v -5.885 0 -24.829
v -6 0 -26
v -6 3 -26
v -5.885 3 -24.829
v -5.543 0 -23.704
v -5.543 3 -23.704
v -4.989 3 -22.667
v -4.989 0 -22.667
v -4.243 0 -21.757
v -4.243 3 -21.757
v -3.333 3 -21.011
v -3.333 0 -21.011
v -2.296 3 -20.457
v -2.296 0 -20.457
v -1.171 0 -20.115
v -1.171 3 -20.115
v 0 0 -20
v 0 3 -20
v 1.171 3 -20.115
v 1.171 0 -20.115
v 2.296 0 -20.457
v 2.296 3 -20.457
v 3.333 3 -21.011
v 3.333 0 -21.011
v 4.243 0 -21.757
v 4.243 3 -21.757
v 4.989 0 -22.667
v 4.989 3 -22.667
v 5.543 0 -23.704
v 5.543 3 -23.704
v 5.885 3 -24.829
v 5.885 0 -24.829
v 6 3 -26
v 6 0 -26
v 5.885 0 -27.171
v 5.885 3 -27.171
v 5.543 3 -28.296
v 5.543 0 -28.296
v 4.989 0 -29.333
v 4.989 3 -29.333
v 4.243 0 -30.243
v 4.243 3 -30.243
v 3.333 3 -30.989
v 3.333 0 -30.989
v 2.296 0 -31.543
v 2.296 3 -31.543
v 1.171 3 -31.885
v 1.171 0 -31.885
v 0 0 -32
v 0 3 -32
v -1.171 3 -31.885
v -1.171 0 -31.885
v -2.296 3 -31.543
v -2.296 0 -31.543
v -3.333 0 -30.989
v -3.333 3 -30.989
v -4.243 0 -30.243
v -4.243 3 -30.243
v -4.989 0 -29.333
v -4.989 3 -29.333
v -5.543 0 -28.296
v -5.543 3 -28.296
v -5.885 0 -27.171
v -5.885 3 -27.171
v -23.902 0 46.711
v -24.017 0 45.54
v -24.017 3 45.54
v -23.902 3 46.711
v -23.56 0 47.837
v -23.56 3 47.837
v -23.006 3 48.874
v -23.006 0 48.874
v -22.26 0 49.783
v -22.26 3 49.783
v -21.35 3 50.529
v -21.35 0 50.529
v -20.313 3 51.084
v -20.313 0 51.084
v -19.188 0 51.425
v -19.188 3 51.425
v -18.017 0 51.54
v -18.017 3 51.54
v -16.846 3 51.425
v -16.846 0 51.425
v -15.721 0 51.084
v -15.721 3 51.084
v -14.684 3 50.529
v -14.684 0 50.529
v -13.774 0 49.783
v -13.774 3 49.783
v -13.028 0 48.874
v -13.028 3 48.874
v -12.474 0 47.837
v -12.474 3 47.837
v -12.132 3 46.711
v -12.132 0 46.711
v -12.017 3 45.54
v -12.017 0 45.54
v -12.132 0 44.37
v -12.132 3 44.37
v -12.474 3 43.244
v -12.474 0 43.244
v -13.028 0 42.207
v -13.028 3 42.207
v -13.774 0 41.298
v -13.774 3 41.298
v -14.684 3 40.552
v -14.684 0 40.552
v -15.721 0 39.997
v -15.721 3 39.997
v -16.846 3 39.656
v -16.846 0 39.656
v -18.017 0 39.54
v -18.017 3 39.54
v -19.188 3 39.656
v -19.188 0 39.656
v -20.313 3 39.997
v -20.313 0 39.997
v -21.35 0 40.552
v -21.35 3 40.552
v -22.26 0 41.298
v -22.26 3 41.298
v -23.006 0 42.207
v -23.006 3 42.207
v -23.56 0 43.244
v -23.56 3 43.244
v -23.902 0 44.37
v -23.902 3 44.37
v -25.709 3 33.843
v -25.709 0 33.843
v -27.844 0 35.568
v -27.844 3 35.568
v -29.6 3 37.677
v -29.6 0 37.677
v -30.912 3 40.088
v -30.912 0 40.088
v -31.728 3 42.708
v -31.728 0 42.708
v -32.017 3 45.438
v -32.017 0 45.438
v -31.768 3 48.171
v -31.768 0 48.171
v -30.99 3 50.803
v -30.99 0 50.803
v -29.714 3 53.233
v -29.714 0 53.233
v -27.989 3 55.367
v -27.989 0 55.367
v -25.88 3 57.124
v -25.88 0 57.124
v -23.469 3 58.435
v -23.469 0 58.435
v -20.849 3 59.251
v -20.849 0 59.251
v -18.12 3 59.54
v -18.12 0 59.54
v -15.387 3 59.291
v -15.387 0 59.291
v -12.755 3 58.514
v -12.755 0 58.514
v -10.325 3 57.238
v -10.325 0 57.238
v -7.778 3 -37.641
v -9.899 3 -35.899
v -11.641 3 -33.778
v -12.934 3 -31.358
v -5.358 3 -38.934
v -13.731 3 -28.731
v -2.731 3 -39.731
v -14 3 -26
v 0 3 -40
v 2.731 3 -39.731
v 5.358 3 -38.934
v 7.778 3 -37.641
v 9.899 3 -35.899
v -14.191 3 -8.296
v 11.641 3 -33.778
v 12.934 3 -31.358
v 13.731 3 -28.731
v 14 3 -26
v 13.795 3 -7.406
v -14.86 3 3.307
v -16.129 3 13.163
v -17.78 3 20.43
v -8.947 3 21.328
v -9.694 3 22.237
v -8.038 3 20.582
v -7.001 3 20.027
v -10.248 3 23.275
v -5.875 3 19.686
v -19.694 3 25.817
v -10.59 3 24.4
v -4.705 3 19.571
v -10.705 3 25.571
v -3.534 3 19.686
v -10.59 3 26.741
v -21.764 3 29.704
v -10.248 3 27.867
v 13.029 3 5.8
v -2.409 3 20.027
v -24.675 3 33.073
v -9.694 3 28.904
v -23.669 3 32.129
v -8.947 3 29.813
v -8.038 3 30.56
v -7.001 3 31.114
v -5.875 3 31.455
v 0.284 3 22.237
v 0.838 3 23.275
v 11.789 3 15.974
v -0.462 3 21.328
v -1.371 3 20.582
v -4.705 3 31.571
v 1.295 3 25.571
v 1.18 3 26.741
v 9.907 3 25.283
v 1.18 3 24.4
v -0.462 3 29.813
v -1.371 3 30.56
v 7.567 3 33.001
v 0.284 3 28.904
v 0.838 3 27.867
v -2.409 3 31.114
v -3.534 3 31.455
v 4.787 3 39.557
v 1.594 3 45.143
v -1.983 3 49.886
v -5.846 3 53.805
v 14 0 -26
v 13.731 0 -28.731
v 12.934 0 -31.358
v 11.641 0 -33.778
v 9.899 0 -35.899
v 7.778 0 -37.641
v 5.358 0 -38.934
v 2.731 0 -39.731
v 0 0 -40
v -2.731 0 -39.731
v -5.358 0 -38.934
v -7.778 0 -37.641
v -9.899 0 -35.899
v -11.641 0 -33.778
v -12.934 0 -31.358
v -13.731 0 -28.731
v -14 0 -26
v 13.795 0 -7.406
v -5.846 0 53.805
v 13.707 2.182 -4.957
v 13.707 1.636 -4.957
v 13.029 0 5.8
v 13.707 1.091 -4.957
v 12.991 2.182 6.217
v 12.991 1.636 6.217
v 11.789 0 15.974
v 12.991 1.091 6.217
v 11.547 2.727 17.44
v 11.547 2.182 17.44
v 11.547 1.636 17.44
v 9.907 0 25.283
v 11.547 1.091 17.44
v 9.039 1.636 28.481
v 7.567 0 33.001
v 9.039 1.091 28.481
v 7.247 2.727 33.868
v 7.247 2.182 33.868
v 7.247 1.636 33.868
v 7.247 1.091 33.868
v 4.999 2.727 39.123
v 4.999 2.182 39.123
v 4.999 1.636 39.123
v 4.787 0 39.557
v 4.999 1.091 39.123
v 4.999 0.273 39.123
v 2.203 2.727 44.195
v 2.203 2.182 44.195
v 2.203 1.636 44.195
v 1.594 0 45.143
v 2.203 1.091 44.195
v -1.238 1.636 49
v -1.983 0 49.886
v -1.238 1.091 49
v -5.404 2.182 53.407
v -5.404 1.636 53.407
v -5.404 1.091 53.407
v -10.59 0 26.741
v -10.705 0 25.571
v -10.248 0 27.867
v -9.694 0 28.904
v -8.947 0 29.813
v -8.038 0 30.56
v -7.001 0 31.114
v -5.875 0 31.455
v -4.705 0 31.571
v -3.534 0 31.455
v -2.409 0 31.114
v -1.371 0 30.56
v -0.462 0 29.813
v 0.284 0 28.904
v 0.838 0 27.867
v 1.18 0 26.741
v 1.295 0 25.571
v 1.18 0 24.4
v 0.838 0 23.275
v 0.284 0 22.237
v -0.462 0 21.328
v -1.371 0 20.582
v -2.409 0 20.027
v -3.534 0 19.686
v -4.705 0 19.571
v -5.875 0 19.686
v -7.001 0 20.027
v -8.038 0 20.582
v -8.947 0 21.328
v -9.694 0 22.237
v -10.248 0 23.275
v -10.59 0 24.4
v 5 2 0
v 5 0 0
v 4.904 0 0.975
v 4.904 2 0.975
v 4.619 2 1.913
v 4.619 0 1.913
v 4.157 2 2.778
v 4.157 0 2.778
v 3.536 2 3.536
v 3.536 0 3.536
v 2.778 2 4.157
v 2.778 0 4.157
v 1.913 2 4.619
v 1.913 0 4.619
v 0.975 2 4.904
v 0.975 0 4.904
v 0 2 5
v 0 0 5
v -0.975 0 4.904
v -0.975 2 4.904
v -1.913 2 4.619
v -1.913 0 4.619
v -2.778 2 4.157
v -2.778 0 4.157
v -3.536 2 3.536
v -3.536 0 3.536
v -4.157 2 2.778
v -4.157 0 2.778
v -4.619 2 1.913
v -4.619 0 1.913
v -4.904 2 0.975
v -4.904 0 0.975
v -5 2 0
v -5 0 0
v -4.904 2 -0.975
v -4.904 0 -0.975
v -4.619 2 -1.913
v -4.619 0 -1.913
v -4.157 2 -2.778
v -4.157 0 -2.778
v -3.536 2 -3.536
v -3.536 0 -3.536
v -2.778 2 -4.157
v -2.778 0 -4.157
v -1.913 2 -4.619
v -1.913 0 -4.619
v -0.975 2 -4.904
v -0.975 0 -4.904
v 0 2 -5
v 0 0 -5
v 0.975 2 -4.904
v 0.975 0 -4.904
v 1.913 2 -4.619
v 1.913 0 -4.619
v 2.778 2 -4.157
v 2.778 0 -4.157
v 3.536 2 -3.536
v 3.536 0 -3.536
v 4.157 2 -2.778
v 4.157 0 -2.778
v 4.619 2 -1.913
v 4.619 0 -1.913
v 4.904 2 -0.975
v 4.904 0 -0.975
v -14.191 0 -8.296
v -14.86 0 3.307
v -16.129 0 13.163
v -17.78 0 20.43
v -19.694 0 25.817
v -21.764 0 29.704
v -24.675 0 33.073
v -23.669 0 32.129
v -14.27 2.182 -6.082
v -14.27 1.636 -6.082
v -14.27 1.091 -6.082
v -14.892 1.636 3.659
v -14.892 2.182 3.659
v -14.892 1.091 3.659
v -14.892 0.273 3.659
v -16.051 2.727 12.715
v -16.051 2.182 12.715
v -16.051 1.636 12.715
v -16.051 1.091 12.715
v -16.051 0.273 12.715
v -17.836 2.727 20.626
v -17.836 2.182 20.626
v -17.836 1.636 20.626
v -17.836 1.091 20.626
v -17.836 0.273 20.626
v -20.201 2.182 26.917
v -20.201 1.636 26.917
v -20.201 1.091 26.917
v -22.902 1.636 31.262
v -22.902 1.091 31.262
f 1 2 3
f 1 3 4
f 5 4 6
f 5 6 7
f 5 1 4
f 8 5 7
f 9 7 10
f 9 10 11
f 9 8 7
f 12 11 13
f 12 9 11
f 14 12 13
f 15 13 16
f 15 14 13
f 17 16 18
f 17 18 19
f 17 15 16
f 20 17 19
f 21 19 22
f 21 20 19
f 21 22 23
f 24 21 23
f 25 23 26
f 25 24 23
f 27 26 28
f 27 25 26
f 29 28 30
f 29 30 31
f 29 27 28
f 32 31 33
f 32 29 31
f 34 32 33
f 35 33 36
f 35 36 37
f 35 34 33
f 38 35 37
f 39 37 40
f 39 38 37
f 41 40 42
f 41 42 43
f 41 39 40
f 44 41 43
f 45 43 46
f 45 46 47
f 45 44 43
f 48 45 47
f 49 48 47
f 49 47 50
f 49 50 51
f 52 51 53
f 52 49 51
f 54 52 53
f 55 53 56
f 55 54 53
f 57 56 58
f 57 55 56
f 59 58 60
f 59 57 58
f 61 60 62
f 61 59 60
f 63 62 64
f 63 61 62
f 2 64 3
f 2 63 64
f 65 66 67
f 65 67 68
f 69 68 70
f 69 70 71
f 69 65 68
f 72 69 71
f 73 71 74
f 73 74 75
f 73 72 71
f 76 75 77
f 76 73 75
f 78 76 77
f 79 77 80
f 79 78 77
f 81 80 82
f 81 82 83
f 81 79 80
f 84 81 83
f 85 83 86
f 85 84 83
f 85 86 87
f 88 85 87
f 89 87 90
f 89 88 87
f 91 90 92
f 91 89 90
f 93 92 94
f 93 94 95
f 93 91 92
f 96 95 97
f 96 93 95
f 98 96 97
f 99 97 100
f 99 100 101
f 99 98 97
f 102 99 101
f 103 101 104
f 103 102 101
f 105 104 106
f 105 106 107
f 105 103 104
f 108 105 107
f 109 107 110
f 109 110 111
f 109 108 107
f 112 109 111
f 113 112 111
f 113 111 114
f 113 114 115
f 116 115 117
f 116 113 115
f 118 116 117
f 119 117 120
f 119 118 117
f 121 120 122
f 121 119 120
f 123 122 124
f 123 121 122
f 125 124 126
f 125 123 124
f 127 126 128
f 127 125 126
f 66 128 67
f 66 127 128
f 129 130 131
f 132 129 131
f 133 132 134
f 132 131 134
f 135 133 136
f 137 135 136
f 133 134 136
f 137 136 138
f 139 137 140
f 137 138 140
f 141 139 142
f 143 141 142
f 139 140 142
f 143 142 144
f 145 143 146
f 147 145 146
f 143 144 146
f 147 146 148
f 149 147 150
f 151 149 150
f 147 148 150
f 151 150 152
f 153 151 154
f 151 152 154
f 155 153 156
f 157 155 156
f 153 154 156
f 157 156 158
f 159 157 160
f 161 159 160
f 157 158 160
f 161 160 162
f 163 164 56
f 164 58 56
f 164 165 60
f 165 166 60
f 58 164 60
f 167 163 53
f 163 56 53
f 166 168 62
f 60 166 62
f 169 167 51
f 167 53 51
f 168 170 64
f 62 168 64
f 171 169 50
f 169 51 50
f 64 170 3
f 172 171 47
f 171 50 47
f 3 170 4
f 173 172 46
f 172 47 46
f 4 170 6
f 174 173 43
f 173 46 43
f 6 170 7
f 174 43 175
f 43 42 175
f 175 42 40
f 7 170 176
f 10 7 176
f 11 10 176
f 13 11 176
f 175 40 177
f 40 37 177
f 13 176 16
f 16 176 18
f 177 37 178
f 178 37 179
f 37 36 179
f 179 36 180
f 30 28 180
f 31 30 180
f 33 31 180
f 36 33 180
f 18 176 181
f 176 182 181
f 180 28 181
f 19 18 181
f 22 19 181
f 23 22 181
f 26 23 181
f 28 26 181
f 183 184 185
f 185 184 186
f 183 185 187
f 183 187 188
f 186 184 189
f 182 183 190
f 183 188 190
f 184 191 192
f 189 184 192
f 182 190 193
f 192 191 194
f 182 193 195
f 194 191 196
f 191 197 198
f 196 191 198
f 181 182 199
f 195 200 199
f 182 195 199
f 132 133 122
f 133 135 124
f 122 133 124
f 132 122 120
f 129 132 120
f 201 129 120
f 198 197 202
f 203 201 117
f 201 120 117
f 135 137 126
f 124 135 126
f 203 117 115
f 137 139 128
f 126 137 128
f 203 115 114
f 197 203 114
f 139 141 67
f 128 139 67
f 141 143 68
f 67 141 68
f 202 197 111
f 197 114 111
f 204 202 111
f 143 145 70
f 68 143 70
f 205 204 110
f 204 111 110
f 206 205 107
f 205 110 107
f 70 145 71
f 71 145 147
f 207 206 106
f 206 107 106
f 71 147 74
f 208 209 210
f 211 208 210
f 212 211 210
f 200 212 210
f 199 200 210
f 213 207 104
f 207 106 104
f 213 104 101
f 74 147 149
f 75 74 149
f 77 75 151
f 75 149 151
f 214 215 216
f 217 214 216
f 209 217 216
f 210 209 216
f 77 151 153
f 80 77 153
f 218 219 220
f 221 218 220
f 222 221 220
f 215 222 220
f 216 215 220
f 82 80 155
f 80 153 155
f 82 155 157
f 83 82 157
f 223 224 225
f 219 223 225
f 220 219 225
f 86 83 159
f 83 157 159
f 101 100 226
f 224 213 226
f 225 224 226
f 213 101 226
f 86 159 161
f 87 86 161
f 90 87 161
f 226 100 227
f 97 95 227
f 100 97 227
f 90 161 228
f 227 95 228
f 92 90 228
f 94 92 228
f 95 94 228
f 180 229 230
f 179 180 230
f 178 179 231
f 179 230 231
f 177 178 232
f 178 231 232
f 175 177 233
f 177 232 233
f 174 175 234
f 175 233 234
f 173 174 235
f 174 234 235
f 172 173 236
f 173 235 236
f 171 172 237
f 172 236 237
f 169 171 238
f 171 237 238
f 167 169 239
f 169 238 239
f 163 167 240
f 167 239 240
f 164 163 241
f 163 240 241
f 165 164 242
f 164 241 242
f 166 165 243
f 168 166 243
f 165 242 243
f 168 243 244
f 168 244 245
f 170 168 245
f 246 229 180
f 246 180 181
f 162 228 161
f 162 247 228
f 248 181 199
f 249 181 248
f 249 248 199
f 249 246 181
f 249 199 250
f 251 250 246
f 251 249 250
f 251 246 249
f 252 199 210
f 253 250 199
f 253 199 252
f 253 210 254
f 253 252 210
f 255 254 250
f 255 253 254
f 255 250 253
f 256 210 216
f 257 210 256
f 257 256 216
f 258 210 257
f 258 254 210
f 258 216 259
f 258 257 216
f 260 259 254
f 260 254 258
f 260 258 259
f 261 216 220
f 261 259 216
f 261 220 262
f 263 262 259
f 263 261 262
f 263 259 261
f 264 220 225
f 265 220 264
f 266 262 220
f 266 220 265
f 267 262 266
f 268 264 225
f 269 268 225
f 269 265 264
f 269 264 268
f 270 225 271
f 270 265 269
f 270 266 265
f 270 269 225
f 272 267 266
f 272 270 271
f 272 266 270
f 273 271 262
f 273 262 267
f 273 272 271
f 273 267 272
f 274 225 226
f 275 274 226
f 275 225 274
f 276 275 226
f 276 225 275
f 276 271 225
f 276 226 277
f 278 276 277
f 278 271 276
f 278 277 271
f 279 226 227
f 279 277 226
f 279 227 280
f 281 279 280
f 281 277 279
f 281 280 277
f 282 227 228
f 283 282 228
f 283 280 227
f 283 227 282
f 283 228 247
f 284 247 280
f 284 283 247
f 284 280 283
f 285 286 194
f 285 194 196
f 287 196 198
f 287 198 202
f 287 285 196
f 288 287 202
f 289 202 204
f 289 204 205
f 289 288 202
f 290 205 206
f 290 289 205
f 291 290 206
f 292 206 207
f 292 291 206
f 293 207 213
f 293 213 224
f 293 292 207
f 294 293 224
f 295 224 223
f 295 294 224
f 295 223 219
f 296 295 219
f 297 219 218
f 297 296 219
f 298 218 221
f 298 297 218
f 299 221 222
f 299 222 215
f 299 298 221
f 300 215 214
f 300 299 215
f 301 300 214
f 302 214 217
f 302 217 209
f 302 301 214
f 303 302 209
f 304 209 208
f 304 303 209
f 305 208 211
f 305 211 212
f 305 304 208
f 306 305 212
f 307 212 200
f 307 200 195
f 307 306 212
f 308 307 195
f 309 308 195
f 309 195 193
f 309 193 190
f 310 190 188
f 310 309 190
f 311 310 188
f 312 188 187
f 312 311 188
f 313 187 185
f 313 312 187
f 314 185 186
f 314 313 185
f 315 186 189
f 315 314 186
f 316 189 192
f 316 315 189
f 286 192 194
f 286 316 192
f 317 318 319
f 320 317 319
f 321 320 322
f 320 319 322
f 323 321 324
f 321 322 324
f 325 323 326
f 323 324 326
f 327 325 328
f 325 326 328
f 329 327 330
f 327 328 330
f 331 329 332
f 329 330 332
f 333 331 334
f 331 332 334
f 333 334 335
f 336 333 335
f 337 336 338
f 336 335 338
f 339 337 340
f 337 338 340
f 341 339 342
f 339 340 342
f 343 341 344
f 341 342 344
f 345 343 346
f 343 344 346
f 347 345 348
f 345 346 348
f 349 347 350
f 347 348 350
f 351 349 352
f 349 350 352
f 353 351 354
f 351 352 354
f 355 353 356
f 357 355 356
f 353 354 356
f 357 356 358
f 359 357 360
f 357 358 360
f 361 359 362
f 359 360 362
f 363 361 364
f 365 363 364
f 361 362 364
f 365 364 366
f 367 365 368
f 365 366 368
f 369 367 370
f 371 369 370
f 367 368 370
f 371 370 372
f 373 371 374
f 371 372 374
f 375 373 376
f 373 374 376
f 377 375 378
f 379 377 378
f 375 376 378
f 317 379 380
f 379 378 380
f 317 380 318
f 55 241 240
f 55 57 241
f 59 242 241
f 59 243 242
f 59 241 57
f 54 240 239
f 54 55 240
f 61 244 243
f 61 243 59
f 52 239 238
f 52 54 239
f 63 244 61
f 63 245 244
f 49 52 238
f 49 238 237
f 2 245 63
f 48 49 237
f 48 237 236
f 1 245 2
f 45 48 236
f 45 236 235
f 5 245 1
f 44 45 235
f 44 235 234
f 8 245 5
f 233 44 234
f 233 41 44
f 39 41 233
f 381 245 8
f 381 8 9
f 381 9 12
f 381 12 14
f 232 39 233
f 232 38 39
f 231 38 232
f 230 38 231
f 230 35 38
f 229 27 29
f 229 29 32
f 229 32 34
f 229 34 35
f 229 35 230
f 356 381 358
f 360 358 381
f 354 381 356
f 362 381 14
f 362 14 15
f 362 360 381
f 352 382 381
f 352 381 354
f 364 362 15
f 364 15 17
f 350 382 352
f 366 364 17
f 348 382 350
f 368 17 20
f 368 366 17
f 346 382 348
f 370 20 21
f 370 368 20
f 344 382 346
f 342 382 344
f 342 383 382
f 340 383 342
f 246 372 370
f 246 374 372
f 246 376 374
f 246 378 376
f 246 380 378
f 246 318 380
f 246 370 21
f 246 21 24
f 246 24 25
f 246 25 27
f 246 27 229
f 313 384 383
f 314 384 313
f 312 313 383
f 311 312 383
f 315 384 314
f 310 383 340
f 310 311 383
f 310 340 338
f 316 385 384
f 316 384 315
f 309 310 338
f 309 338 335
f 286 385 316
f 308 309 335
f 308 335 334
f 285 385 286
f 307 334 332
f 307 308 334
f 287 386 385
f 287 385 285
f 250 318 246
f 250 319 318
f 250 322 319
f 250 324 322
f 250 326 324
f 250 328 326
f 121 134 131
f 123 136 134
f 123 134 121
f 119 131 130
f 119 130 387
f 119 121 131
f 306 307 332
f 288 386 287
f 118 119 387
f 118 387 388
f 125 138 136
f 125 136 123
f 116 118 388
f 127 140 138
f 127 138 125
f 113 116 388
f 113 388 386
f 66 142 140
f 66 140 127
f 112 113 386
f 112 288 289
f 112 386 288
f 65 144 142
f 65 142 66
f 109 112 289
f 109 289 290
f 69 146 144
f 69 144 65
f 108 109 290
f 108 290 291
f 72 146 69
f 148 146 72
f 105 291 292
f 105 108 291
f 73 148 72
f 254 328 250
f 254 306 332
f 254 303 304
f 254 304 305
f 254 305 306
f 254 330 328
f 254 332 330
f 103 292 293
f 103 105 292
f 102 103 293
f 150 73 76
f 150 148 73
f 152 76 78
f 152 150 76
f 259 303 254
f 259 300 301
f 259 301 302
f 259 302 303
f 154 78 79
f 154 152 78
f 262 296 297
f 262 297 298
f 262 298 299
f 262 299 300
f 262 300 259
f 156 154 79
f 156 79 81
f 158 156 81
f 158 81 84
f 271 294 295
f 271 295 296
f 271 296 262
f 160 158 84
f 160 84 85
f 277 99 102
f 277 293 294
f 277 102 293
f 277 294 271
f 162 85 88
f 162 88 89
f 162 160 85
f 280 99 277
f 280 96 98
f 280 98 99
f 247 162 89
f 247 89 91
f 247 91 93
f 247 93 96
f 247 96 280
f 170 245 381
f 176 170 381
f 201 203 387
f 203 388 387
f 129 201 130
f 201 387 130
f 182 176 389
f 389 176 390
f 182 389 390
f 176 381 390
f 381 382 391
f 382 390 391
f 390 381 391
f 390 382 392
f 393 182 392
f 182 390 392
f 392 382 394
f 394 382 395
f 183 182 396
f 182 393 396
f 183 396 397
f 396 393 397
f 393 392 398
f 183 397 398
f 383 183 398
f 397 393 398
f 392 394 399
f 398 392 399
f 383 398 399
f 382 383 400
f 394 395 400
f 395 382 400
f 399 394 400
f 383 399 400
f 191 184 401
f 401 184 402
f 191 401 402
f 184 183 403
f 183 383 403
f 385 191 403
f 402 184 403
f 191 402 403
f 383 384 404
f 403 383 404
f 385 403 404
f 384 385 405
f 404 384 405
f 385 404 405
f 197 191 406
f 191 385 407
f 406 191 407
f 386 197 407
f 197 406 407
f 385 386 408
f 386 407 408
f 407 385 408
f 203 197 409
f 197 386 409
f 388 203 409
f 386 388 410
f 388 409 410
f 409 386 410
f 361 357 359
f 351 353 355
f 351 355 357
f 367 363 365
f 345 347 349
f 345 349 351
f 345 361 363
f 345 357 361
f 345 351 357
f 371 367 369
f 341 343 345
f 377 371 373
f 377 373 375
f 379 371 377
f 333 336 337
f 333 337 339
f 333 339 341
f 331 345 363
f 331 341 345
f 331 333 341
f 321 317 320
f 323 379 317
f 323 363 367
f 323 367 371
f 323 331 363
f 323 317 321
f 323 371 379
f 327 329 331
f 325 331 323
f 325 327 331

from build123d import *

# Parameters (mm, degrees)
F0_R     = 6
F1_DEPTH = 3
F3_R     = 5.5
F4_DEPTH = 2
F5_R     = 5
F6_DEPTH = 2
F9_ANGLE = 180


# Not quite as in the source:
# - ends of sketch curves that miss each other by under 0.0002 mm in the source are joined
# - the dataset's text gives a spline's control points without its knots; the knots are read off the source's solid


with BuildPart() as f1:
    # F0 (on Front) → F1 (new body)
    with BuildSketch(Plane.XZ):
        with BuildLine():
            add(Edge.make_bspline(
                [(-14, -26), (-14, -22.75), (-14.0004523743, -15.9105291262), (-13.7828666825, -5.0097493319), (-13.1111411806, 6.2097947293), (-11.720563989, 17.4707102353), (-9.6943656003, 26.7000282147), (-7.3231272908, 33.8894297819), (-5.0899646489, 39.15233442), (-2.3107556278, 44.2379137207), (1.1152604329, 49.0651401417), (5.2757801793, 53.5029660938), (8.5623848122, 56.0788774956), (10.3247279458, 57.2378033443)],
                knots=[0, 0, 0, 0, 0.125, 0.25, 0.375, 0.5, 0.625, 0.6875, 0.75, 0.8125, 0.875, 0.9375, 1, 1, 1, 1], degree=3))
            ThreePointArc((-14, -26), (0, -40), (14, -26))
            add(Edge.make_bspline(
                [(14, -26), (14, -22.75), (14.0004523743, -16.1086995406), (14.205139987, -6.0382727532), (14.8002343988, 3.7711749321), (15.9432970346, 12.9047719201), (17.4360428506, 19.5652612944), (18.9356431663, 24.0782015665), (20.186235287, 27.0007682339), (21.5241909854, 29.4228421126), (22.9015337641, 31.3389176928), (24.2833500376, 32.7935083509), (25.2194773121, 33.5209300274), (25.7092571932, 33.8430120472)],
                knots=[0, 0, 0, 0, 0.125, 0.25, 0.375, 0.5, 0.625, 0.6875, 0.75, 0.8125, 0.875, 0.9375, 0.9999998504, 0.9999998504, 0.9999998504, 0.9999998504], degree=3))
            ThreePointArc((25.7092571932, 33.8430120472), (29.7143803557, 53.2326803132), (10.3247279458, 57.2378033443))
        make_face()
        with Locations((0, -26)):
            Circle(F0_R, mode=Mode.SUBTRACT)
        with Locations((4.704827633, 25.5707762288)):
            Circle(F0_R, mode=Mode.SUBTRACT)
        with Locations((18.0169899591, 45.5404115335)):
            Circle(F0_R, mode=Mode.SUBTRACT)
    extrude(amount=F1_DEPTH)


with BuildPart() as f2_1:
    # F2: copy of F1
    add(f1.part.moved(Location((50.8967, 0, 0))))

    # F3 (on face) → F4 (cut)
    with BuildSketch(Plane.XZ.offset(3)):
        with Locations((50.8965918246, 0)):
            Circle(F3_R)
    extrude(amount=-F4_DEPTH, mode=Mode.SUBTRACT)


with BuildPart() as f1_1:
    add(f1.part)

    # F5 (on face) → F6 (cut)
    with BuildSketch(Plane(origin=(0, 0, 0), x_dir=(-1, 0, 0), z_dir=(0, 1, 0))):
        Circle(F5_R)
    extrude(amount=-F6_DEPTH, mode=Mode.SUBTRACT)


with BuildPart() as f1_2:
    # F9: moved
    add(f1_1.part.rotate(Axis((0, 0, 5.4726116359), (0, 0, -1)), F9_ANGLE))


solid = f1_2.part
